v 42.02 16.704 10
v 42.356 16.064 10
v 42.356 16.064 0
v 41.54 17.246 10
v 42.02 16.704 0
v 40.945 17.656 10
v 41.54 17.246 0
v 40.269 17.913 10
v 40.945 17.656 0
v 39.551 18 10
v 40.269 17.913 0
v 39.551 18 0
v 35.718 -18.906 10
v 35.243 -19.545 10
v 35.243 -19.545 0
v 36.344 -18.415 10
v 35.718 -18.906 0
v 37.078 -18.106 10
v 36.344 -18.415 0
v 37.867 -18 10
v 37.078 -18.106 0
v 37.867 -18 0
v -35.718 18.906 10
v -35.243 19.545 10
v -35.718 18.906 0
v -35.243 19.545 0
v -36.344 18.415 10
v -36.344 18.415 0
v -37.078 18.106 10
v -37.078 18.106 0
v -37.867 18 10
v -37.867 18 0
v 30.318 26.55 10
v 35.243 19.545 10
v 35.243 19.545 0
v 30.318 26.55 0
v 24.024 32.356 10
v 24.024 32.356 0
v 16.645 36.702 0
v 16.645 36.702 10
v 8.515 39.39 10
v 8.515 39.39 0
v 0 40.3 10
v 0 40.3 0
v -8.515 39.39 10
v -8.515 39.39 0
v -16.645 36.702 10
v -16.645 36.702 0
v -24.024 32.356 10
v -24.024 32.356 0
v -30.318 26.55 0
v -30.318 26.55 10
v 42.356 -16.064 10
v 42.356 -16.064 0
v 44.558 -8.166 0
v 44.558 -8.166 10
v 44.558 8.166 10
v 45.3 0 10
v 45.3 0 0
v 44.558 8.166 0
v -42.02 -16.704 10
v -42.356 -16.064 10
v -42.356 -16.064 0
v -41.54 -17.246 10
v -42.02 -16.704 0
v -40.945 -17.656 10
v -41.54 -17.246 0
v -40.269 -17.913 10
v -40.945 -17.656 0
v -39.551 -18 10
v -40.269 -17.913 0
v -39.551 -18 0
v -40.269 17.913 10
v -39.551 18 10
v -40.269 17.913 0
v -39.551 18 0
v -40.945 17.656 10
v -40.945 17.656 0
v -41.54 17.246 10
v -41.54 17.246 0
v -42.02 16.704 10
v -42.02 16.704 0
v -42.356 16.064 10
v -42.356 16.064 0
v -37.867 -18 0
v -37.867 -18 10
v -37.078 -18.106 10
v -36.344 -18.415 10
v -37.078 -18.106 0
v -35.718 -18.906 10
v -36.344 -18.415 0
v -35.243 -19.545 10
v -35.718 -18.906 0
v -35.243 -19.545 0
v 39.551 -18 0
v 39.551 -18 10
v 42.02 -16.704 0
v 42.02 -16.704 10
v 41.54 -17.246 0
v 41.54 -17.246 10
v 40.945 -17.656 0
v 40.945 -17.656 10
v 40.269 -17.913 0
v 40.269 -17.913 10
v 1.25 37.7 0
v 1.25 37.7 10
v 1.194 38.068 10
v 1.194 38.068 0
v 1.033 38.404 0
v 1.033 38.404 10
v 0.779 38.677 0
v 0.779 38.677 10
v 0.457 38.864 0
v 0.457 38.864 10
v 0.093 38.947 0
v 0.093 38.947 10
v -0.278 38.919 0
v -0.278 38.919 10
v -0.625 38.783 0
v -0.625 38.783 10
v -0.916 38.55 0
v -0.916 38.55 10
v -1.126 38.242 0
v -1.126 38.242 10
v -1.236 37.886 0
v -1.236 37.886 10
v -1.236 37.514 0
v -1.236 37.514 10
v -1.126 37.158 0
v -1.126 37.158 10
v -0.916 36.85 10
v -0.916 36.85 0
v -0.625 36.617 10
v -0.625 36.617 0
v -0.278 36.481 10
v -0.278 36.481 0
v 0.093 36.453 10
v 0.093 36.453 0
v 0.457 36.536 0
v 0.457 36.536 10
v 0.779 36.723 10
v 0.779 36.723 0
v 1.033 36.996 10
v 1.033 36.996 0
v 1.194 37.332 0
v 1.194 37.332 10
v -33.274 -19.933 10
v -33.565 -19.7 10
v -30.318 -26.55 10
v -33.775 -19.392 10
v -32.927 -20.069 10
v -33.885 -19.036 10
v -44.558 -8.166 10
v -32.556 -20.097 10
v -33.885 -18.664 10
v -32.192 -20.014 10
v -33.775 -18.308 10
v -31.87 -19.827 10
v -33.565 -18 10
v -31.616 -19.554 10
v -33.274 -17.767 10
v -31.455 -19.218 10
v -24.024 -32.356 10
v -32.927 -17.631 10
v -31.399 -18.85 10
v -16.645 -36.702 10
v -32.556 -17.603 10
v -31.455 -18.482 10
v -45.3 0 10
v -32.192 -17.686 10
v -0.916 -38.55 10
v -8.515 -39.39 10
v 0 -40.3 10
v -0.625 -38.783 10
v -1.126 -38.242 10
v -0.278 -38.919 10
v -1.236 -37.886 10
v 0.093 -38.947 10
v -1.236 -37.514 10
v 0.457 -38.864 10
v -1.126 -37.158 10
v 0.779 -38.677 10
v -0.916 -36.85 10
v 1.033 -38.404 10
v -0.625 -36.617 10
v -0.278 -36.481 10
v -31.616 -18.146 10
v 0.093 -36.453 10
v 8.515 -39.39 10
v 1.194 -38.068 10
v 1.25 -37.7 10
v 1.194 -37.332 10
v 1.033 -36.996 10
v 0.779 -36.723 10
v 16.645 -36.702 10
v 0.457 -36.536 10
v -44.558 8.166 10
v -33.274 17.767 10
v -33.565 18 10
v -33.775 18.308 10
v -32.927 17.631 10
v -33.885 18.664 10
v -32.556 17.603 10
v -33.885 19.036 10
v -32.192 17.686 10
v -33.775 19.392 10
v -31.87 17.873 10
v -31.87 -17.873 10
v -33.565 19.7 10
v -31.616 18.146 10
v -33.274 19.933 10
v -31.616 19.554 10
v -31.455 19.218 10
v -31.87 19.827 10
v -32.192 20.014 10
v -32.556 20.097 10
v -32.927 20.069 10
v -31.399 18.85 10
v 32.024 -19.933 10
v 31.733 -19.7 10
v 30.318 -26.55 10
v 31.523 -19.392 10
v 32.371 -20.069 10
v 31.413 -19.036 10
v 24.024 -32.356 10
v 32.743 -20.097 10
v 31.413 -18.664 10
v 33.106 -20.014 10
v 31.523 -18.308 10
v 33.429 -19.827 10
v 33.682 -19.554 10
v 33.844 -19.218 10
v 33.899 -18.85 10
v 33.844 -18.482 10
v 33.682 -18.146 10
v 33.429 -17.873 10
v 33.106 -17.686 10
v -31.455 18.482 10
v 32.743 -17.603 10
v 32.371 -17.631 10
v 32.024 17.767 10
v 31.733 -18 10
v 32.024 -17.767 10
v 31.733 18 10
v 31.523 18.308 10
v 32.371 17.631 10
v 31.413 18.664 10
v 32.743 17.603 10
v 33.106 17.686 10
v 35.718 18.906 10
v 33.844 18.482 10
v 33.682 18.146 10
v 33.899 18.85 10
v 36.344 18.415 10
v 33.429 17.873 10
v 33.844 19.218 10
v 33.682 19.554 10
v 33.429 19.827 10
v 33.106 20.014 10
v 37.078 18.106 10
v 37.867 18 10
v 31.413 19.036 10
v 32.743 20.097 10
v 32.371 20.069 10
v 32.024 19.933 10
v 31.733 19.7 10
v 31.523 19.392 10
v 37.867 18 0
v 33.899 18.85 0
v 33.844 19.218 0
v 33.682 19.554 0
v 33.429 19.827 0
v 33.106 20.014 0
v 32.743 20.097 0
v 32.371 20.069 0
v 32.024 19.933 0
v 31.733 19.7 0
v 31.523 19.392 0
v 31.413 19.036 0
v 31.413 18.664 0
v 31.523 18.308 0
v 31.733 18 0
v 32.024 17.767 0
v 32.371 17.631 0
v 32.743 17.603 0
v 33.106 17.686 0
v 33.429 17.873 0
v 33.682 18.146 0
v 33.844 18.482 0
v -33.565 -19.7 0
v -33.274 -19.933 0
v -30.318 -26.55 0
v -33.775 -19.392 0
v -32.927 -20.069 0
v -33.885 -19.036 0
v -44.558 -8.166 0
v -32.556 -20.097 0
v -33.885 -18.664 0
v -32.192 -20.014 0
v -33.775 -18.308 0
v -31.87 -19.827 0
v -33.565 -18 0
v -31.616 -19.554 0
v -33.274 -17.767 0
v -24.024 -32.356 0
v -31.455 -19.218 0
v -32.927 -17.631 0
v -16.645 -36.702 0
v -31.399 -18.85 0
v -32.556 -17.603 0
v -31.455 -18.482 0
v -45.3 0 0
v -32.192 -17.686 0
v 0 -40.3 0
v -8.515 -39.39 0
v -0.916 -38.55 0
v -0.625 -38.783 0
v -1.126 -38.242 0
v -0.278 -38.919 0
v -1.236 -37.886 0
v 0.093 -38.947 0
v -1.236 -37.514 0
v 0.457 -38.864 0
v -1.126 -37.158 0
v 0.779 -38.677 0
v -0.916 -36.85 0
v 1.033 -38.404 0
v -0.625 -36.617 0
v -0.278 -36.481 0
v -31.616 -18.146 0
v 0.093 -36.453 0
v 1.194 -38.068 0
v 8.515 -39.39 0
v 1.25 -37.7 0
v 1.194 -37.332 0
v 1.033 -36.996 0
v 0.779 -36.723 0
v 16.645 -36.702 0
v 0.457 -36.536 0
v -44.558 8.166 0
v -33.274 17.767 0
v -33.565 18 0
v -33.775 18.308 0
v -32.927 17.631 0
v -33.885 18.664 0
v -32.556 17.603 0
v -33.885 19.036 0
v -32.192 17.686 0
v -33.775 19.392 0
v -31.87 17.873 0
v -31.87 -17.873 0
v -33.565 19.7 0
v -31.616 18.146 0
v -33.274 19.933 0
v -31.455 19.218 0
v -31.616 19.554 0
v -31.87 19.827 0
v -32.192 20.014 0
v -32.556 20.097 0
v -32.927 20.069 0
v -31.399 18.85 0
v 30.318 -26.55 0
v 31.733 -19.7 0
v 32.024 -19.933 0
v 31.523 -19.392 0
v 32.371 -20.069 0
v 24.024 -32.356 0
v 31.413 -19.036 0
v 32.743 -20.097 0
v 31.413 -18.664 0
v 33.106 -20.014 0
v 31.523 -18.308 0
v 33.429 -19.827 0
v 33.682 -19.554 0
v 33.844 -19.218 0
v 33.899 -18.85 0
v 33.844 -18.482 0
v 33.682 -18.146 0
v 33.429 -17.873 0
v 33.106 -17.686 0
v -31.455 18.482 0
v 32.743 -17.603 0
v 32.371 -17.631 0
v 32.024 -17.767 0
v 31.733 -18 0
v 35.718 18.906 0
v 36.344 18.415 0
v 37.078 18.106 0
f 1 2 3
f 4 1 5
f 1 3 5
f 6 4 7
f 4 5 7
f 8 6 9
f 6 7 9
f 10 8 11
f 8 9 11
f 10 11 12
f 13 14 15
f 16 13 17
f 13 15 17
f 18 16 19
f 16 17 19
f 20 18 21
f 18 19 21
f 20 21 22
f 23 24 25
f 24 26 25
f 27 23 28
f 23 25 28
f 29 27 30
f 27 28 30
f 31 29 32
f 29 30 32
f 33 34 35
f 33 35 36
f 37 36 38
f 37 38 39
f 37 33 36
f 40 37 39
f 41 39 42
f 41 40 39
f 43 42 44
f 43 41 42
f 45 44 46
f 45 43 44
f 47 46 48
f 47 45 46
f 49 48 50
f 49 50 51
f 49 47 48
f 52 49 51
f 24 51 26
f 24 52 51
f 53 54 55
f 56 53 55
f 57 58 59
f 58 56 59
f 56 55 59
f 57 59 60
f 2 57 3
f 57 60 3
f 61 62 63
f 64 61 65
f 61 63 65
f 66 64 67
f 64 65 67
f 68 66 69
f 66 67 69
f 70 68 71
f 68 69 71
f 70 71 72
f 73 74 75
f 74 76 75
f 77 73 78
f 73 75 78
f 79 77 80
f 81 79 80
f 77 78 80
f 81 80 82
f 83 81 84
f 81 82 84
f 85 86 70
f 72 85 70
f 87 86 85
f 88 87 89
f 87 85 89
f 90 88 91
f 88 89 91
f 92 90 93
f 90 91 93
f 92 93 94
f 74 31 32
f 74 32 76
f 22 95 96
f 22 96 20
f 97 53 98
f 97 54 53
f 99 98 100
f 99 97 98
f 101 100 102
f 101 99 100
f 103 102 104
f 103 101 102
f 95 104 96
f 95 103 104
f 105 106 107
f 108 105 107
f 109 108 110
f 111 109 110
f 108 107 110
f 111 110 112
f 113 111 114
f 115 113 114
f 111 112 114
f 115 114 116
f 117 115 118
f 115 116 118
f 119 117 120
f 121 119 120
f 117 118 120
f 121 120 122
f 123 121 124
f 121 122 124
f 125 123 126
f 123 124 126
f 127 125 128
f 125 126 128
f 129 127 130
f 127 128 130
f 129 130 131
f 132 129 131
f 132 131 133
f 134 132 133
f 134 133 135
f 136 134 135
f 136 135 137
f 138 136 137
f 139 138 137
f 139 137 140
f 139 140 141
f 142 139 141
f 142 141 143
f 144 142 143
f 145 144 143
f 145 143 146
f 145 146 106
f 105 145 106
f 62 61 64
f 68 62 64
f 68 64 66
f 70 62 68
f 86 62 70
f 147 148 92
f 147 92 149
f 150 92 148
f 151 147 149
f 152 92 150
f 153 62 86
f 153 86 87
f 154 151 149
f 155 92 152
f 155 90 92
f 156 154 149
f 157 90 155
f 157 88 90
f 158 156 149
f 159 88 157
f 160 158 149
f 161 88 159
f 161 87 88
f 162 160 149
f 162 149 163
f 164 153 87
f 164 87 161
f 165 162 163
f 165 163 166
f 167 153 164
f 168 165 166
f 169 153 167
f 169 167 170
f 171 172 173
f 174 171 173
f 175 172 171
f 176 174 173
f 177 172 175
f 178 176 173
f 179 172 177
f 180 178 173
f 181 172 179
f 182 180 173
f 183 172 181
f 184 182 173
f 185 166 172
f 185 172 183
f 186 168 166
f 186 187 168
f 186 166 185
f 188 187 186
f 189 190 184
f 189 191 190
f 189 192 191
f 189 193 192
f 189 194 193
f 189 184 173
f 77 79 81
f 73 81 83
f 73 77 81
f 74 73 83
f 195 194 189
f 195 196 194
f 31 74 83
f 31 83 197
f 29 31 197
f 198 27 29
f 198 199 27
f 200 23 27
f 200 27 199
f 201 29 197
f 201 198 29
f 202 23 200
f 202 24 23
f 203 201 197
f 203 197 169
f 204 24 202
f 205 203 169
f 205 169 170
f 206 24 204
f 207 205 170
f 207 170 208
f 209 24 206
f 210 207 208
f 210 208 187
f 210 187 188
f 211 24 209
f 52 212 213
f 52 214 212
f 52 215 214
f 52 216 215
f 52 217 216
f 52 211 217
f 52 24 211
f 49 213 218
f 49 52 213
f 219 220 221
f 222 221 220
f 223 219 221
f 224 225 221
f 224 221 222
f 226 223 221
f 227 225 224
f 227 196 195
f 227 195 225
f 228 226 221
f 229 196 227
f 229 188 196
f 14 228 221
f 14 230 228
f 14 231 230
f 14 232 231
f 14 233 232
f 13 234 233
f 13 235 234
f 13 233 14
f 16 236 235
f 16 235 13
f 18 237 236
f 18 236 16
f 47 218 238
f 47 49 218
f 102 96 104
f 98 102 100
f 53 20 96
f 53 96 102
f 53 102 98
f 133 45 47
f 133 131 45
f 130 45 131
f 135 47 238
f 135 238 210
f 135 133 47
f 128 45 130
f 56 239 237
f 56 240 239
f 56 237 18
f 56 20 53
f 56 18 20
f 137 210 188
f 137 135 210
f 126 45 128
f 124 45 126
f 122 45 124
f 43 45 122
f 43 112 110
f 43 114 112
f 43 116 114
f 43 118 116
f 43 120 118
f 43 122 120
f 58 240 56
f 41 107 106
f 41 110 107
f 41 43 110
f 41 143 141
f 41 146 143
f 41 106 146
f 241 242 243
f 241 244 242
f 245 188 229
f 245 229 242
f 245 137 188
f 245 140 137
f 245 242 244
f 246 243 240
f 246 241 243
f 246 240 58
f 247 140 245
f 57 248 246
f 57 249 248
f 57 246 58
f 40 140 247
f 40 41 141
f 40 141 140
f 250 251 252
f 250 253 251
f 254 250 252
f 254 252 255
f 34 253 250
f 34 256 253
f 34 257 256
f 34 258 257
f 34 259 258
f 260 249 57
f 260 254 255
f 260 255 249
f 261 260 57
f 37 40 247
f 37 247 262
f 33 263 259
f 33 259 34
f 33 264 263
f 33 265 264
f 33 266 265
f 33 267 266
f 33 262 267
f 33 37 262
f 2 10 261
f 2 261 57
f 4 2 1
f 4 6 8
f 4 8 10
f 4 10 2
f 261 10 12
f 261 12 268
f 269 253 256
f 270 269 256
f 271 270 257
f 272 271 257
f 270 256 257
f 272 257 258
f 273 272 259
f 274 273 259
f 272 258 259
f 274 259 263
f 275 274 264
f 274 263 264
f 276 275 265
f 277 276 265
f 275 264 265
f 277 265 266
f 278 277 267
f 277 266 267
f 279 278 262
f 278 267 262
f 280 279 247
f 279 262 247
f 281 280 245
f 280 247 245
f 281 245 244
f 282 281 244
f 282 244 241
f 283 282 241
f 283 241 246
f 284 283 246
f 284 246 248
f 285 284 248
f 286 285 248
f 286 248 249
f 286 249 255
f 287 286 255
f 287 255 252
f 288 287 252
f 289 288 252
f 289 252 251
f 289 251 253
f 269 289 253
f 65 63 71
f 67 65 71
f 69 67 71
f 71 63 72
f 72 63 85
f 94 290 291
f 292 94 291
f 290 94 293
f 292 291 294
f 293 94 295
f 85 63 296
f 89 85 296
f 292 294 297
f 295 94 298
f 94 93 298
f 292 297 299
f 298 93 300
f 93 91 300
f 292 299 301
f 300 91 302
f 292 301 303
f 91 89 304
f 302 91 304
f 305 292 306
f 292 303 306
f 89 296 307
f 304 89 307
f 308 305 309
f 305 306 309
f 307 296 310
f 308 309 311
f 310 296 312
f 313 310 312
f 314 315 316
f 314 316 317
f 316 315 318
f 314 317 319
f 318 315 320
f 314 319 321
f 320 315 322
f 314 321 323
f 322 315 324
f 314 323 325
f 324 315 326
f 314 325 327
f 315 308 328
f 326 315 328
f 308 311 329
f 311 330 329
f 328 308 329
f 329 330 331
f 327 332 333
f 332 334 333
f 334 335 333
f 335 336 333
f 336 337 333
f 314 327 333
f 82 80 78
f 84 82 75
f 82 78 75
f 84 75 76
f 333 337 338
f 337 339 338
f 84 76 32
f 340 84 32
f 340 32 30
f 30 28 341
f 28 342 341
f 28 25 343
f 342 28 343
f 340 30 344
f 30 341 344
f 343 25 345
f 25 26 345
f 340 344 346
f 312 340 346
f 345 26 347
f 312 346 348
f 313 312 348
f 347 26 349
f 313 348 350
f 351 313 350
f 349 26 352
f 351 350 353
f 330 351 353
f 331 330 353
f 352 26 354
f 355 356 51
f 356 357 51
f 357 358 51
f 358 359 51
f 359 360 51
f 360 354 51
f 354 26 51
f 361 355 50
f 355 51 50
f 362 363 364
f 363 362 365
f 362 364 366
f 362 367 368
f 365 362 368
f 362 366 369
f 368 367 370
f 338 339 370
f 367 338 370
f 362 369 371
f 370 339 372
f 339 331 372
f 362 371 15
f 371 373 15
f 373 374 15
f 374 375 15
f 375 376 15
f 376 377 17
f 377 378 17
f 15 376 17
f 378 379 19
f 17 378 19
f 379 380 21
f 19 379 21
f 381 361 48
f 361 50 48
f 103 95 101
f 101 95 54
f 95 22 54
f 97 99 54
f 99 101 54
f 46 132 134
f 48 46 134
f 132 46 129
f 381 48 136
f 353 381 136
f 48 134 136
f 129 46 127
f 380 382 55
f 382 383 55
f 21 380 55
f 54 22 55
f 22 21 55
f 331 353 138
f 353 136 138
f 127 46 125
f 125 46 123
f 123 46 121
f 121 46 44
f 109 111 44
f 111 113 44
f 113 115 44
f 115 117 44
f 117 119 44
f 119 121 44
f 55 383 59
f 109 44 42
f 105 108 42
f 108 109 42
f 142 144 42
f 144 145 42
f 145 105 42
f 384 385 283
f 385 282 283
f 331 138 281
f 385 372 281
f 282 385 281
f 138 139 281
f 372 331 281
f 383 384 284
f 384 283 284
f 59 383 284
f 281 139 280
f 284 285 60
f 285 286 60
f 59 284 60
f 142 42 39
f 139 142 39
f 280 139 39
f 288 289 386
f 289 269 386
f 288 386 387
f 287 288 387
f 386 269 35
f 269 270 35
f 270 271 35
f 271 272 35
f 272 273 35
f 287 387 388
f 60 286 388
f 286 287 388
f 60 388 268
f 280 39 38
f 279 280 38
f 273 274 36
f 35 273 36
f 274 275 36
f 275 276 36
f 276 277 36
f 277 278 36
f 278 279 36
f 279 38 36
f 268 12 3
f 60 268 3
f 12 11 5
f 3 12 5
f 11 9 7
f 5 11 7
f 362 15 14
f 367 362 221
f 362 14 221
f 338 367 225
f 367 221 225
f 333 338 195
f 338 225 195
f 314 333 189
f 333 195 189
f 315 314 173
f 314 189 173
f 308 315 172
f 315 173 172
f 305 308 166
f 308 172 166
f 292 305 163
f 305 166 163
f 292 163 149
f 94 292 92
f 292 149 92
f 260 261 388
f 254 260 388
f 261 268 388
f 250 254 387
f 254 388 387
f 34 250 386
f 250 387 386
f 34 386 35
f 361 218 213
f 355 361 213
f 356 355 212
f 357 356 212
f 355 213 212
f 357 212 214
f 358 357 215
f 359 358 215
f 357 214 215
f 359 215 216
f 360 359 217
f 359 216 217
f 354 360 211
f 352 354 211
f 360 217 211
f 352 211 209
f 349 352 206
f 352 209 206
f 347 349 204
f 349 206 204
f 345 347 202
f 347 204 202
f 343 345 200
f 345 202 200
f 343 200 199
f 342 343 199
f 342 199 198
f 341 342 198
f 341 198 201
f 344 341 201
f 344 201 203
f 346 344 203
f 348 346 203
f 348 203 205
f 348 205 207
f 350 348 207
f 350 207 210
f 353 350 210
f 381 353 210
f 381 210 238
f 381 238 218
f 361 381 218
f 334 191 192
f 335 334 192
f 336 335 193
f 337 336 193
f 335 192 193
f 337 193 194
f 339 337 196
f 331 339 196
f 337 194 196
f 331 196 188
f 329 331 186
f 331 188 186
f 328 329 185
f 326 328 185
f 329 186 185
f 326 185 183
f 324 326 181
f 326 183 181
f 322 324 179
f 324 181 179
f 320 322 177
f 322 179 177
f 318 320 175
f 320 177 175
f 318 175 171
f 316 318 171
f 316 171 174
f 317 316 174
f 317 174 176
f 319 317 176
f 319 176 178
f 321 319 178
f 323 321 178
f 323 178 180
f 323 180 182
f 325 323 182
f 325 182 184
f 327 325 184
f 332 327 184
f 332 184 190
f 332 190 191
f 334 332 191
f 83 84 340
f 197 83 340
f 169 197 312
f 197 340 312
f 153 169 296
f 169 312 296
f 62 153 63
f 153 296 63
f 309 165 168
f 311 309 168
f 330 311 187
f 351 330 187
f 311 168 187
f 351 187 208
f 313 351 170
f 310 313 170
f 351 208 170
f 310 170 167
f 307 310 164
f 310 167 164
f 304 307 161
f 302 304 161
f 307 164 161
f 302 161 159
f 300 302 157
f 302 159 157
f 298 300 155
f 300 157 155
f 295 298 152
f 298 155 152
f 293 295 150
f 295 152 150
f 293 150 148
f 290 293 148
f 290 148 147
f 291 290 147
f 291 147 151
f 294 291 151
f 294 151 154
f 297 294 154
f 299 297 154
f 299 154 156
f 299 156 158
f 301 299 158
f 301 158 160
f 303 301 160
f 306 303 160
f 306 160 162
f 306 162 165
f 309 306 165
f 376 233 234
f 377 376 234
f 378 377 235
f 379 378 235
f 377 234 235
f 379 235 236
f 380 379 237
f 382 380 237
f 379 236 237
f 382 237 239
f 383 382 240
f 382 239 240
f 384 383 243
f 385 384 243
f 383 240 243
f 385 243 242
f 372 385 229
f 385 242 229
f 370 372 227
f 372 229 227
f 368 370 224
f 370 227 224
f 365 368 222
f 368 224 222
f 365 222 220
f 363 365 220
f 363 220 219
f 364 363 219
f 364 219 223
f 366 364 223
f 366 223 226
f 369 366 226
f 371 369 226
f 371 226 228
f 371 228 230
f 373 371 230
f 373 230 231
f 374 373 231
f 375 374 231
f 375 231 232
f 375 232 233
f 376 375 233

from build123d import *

# Parameters (mm, degrees)
SKETCH_1_R          = 45.3
EXTRUDE_1_DEPTH     = 10
CUT_EXTRUDE_1_DEPTH = 11
FILLET_1_R          = 3
SKETCH_3_R          = 1.25
CUT_EXTRUDE_2_DEPTH = 11


with BuildPart() as part:
    # 草图1 → 凸台-拉伸1 (new body)
    with BuildSketch(Plane.XY):
        Circle(SKETCH_1_R)
    extrude(amount=EXTRUDE_1_DEPTH)

    # 草图2 → 切除-拉伸1 (cut, through all)
    with BuildSketch(Plane.XY.offset(10)):
        with BuildLine():
            Line((-36.056760808, 18), (-41.570301899, 18))
            ThreePointArc((-41.570301899, 18), (0, 45.3), (41.570301899, 18))
            Line((41.570301899, 18), (36.056760808, 18))
            ThreePointArc((36.056760808, 18), (0, 40.3), (-36.056760808, 18))
        make_face()
        with BuildLine():
            Line((-36.056760808, -18), (-41.734622438, -18))
            ThreePointArc((-41.734622438, -18), (0, -45.450838386), (41.734622438, -18))
            Line((41.734622438, -18), (36.056760808, -18))
            ThreePointArc((36.056760808, -18), (0, -40.3), (-36.056760808, -18))
        make_face()
    extrude(amount=-CUT_EXTRUDE_1_DEPTH, mode=Mode.SUBTRACT)

    # 圆角1
    fillet_1_edges = [part.edges().sort_by_distance(p)[0] for p in [
        (36.056760808, 18, 5),
        (-36.056760808, 18, 5),
        (-41.570301899, 18, 5),
        (41.570301899, 18, 5),
        (41.570301899, -18, 5),
        (36.056760808, -18, 5),
        (-41.570301899, -18, 5),
        (-36.056760808, -18, 5),
    ]]
    fillet(fillet_1_edges, radius=FILLET_1_R)

    # 草图3 → 切除-拉伸2 (cut, through all)
    with BuildSketch(Plane.XY.offset(10)):
        with Locations((0, 37.7)):
            Circle(SKETCH_3_R)
        with Locations((32.649157723, 18.85)):
            Circle(SKETCH_3_R)
        with Locations((32.649157723, -18.85)):
            Circle(SKETCH_3_R)
        with Locations((0, -37.7)):
            Circle(SKETCH_3_R)
        with Locations((-32.649157723, -18.85)):
            Circle(SKETCH_3_R)
        with Locations((-32.649157723, 18.85)):
            Circle(SKETCH_3_R)
    extrude(amount=-CUT_EXTRUDE_2_DEPTH, mode=Mode.SUBTRACT)


solid = part.part
